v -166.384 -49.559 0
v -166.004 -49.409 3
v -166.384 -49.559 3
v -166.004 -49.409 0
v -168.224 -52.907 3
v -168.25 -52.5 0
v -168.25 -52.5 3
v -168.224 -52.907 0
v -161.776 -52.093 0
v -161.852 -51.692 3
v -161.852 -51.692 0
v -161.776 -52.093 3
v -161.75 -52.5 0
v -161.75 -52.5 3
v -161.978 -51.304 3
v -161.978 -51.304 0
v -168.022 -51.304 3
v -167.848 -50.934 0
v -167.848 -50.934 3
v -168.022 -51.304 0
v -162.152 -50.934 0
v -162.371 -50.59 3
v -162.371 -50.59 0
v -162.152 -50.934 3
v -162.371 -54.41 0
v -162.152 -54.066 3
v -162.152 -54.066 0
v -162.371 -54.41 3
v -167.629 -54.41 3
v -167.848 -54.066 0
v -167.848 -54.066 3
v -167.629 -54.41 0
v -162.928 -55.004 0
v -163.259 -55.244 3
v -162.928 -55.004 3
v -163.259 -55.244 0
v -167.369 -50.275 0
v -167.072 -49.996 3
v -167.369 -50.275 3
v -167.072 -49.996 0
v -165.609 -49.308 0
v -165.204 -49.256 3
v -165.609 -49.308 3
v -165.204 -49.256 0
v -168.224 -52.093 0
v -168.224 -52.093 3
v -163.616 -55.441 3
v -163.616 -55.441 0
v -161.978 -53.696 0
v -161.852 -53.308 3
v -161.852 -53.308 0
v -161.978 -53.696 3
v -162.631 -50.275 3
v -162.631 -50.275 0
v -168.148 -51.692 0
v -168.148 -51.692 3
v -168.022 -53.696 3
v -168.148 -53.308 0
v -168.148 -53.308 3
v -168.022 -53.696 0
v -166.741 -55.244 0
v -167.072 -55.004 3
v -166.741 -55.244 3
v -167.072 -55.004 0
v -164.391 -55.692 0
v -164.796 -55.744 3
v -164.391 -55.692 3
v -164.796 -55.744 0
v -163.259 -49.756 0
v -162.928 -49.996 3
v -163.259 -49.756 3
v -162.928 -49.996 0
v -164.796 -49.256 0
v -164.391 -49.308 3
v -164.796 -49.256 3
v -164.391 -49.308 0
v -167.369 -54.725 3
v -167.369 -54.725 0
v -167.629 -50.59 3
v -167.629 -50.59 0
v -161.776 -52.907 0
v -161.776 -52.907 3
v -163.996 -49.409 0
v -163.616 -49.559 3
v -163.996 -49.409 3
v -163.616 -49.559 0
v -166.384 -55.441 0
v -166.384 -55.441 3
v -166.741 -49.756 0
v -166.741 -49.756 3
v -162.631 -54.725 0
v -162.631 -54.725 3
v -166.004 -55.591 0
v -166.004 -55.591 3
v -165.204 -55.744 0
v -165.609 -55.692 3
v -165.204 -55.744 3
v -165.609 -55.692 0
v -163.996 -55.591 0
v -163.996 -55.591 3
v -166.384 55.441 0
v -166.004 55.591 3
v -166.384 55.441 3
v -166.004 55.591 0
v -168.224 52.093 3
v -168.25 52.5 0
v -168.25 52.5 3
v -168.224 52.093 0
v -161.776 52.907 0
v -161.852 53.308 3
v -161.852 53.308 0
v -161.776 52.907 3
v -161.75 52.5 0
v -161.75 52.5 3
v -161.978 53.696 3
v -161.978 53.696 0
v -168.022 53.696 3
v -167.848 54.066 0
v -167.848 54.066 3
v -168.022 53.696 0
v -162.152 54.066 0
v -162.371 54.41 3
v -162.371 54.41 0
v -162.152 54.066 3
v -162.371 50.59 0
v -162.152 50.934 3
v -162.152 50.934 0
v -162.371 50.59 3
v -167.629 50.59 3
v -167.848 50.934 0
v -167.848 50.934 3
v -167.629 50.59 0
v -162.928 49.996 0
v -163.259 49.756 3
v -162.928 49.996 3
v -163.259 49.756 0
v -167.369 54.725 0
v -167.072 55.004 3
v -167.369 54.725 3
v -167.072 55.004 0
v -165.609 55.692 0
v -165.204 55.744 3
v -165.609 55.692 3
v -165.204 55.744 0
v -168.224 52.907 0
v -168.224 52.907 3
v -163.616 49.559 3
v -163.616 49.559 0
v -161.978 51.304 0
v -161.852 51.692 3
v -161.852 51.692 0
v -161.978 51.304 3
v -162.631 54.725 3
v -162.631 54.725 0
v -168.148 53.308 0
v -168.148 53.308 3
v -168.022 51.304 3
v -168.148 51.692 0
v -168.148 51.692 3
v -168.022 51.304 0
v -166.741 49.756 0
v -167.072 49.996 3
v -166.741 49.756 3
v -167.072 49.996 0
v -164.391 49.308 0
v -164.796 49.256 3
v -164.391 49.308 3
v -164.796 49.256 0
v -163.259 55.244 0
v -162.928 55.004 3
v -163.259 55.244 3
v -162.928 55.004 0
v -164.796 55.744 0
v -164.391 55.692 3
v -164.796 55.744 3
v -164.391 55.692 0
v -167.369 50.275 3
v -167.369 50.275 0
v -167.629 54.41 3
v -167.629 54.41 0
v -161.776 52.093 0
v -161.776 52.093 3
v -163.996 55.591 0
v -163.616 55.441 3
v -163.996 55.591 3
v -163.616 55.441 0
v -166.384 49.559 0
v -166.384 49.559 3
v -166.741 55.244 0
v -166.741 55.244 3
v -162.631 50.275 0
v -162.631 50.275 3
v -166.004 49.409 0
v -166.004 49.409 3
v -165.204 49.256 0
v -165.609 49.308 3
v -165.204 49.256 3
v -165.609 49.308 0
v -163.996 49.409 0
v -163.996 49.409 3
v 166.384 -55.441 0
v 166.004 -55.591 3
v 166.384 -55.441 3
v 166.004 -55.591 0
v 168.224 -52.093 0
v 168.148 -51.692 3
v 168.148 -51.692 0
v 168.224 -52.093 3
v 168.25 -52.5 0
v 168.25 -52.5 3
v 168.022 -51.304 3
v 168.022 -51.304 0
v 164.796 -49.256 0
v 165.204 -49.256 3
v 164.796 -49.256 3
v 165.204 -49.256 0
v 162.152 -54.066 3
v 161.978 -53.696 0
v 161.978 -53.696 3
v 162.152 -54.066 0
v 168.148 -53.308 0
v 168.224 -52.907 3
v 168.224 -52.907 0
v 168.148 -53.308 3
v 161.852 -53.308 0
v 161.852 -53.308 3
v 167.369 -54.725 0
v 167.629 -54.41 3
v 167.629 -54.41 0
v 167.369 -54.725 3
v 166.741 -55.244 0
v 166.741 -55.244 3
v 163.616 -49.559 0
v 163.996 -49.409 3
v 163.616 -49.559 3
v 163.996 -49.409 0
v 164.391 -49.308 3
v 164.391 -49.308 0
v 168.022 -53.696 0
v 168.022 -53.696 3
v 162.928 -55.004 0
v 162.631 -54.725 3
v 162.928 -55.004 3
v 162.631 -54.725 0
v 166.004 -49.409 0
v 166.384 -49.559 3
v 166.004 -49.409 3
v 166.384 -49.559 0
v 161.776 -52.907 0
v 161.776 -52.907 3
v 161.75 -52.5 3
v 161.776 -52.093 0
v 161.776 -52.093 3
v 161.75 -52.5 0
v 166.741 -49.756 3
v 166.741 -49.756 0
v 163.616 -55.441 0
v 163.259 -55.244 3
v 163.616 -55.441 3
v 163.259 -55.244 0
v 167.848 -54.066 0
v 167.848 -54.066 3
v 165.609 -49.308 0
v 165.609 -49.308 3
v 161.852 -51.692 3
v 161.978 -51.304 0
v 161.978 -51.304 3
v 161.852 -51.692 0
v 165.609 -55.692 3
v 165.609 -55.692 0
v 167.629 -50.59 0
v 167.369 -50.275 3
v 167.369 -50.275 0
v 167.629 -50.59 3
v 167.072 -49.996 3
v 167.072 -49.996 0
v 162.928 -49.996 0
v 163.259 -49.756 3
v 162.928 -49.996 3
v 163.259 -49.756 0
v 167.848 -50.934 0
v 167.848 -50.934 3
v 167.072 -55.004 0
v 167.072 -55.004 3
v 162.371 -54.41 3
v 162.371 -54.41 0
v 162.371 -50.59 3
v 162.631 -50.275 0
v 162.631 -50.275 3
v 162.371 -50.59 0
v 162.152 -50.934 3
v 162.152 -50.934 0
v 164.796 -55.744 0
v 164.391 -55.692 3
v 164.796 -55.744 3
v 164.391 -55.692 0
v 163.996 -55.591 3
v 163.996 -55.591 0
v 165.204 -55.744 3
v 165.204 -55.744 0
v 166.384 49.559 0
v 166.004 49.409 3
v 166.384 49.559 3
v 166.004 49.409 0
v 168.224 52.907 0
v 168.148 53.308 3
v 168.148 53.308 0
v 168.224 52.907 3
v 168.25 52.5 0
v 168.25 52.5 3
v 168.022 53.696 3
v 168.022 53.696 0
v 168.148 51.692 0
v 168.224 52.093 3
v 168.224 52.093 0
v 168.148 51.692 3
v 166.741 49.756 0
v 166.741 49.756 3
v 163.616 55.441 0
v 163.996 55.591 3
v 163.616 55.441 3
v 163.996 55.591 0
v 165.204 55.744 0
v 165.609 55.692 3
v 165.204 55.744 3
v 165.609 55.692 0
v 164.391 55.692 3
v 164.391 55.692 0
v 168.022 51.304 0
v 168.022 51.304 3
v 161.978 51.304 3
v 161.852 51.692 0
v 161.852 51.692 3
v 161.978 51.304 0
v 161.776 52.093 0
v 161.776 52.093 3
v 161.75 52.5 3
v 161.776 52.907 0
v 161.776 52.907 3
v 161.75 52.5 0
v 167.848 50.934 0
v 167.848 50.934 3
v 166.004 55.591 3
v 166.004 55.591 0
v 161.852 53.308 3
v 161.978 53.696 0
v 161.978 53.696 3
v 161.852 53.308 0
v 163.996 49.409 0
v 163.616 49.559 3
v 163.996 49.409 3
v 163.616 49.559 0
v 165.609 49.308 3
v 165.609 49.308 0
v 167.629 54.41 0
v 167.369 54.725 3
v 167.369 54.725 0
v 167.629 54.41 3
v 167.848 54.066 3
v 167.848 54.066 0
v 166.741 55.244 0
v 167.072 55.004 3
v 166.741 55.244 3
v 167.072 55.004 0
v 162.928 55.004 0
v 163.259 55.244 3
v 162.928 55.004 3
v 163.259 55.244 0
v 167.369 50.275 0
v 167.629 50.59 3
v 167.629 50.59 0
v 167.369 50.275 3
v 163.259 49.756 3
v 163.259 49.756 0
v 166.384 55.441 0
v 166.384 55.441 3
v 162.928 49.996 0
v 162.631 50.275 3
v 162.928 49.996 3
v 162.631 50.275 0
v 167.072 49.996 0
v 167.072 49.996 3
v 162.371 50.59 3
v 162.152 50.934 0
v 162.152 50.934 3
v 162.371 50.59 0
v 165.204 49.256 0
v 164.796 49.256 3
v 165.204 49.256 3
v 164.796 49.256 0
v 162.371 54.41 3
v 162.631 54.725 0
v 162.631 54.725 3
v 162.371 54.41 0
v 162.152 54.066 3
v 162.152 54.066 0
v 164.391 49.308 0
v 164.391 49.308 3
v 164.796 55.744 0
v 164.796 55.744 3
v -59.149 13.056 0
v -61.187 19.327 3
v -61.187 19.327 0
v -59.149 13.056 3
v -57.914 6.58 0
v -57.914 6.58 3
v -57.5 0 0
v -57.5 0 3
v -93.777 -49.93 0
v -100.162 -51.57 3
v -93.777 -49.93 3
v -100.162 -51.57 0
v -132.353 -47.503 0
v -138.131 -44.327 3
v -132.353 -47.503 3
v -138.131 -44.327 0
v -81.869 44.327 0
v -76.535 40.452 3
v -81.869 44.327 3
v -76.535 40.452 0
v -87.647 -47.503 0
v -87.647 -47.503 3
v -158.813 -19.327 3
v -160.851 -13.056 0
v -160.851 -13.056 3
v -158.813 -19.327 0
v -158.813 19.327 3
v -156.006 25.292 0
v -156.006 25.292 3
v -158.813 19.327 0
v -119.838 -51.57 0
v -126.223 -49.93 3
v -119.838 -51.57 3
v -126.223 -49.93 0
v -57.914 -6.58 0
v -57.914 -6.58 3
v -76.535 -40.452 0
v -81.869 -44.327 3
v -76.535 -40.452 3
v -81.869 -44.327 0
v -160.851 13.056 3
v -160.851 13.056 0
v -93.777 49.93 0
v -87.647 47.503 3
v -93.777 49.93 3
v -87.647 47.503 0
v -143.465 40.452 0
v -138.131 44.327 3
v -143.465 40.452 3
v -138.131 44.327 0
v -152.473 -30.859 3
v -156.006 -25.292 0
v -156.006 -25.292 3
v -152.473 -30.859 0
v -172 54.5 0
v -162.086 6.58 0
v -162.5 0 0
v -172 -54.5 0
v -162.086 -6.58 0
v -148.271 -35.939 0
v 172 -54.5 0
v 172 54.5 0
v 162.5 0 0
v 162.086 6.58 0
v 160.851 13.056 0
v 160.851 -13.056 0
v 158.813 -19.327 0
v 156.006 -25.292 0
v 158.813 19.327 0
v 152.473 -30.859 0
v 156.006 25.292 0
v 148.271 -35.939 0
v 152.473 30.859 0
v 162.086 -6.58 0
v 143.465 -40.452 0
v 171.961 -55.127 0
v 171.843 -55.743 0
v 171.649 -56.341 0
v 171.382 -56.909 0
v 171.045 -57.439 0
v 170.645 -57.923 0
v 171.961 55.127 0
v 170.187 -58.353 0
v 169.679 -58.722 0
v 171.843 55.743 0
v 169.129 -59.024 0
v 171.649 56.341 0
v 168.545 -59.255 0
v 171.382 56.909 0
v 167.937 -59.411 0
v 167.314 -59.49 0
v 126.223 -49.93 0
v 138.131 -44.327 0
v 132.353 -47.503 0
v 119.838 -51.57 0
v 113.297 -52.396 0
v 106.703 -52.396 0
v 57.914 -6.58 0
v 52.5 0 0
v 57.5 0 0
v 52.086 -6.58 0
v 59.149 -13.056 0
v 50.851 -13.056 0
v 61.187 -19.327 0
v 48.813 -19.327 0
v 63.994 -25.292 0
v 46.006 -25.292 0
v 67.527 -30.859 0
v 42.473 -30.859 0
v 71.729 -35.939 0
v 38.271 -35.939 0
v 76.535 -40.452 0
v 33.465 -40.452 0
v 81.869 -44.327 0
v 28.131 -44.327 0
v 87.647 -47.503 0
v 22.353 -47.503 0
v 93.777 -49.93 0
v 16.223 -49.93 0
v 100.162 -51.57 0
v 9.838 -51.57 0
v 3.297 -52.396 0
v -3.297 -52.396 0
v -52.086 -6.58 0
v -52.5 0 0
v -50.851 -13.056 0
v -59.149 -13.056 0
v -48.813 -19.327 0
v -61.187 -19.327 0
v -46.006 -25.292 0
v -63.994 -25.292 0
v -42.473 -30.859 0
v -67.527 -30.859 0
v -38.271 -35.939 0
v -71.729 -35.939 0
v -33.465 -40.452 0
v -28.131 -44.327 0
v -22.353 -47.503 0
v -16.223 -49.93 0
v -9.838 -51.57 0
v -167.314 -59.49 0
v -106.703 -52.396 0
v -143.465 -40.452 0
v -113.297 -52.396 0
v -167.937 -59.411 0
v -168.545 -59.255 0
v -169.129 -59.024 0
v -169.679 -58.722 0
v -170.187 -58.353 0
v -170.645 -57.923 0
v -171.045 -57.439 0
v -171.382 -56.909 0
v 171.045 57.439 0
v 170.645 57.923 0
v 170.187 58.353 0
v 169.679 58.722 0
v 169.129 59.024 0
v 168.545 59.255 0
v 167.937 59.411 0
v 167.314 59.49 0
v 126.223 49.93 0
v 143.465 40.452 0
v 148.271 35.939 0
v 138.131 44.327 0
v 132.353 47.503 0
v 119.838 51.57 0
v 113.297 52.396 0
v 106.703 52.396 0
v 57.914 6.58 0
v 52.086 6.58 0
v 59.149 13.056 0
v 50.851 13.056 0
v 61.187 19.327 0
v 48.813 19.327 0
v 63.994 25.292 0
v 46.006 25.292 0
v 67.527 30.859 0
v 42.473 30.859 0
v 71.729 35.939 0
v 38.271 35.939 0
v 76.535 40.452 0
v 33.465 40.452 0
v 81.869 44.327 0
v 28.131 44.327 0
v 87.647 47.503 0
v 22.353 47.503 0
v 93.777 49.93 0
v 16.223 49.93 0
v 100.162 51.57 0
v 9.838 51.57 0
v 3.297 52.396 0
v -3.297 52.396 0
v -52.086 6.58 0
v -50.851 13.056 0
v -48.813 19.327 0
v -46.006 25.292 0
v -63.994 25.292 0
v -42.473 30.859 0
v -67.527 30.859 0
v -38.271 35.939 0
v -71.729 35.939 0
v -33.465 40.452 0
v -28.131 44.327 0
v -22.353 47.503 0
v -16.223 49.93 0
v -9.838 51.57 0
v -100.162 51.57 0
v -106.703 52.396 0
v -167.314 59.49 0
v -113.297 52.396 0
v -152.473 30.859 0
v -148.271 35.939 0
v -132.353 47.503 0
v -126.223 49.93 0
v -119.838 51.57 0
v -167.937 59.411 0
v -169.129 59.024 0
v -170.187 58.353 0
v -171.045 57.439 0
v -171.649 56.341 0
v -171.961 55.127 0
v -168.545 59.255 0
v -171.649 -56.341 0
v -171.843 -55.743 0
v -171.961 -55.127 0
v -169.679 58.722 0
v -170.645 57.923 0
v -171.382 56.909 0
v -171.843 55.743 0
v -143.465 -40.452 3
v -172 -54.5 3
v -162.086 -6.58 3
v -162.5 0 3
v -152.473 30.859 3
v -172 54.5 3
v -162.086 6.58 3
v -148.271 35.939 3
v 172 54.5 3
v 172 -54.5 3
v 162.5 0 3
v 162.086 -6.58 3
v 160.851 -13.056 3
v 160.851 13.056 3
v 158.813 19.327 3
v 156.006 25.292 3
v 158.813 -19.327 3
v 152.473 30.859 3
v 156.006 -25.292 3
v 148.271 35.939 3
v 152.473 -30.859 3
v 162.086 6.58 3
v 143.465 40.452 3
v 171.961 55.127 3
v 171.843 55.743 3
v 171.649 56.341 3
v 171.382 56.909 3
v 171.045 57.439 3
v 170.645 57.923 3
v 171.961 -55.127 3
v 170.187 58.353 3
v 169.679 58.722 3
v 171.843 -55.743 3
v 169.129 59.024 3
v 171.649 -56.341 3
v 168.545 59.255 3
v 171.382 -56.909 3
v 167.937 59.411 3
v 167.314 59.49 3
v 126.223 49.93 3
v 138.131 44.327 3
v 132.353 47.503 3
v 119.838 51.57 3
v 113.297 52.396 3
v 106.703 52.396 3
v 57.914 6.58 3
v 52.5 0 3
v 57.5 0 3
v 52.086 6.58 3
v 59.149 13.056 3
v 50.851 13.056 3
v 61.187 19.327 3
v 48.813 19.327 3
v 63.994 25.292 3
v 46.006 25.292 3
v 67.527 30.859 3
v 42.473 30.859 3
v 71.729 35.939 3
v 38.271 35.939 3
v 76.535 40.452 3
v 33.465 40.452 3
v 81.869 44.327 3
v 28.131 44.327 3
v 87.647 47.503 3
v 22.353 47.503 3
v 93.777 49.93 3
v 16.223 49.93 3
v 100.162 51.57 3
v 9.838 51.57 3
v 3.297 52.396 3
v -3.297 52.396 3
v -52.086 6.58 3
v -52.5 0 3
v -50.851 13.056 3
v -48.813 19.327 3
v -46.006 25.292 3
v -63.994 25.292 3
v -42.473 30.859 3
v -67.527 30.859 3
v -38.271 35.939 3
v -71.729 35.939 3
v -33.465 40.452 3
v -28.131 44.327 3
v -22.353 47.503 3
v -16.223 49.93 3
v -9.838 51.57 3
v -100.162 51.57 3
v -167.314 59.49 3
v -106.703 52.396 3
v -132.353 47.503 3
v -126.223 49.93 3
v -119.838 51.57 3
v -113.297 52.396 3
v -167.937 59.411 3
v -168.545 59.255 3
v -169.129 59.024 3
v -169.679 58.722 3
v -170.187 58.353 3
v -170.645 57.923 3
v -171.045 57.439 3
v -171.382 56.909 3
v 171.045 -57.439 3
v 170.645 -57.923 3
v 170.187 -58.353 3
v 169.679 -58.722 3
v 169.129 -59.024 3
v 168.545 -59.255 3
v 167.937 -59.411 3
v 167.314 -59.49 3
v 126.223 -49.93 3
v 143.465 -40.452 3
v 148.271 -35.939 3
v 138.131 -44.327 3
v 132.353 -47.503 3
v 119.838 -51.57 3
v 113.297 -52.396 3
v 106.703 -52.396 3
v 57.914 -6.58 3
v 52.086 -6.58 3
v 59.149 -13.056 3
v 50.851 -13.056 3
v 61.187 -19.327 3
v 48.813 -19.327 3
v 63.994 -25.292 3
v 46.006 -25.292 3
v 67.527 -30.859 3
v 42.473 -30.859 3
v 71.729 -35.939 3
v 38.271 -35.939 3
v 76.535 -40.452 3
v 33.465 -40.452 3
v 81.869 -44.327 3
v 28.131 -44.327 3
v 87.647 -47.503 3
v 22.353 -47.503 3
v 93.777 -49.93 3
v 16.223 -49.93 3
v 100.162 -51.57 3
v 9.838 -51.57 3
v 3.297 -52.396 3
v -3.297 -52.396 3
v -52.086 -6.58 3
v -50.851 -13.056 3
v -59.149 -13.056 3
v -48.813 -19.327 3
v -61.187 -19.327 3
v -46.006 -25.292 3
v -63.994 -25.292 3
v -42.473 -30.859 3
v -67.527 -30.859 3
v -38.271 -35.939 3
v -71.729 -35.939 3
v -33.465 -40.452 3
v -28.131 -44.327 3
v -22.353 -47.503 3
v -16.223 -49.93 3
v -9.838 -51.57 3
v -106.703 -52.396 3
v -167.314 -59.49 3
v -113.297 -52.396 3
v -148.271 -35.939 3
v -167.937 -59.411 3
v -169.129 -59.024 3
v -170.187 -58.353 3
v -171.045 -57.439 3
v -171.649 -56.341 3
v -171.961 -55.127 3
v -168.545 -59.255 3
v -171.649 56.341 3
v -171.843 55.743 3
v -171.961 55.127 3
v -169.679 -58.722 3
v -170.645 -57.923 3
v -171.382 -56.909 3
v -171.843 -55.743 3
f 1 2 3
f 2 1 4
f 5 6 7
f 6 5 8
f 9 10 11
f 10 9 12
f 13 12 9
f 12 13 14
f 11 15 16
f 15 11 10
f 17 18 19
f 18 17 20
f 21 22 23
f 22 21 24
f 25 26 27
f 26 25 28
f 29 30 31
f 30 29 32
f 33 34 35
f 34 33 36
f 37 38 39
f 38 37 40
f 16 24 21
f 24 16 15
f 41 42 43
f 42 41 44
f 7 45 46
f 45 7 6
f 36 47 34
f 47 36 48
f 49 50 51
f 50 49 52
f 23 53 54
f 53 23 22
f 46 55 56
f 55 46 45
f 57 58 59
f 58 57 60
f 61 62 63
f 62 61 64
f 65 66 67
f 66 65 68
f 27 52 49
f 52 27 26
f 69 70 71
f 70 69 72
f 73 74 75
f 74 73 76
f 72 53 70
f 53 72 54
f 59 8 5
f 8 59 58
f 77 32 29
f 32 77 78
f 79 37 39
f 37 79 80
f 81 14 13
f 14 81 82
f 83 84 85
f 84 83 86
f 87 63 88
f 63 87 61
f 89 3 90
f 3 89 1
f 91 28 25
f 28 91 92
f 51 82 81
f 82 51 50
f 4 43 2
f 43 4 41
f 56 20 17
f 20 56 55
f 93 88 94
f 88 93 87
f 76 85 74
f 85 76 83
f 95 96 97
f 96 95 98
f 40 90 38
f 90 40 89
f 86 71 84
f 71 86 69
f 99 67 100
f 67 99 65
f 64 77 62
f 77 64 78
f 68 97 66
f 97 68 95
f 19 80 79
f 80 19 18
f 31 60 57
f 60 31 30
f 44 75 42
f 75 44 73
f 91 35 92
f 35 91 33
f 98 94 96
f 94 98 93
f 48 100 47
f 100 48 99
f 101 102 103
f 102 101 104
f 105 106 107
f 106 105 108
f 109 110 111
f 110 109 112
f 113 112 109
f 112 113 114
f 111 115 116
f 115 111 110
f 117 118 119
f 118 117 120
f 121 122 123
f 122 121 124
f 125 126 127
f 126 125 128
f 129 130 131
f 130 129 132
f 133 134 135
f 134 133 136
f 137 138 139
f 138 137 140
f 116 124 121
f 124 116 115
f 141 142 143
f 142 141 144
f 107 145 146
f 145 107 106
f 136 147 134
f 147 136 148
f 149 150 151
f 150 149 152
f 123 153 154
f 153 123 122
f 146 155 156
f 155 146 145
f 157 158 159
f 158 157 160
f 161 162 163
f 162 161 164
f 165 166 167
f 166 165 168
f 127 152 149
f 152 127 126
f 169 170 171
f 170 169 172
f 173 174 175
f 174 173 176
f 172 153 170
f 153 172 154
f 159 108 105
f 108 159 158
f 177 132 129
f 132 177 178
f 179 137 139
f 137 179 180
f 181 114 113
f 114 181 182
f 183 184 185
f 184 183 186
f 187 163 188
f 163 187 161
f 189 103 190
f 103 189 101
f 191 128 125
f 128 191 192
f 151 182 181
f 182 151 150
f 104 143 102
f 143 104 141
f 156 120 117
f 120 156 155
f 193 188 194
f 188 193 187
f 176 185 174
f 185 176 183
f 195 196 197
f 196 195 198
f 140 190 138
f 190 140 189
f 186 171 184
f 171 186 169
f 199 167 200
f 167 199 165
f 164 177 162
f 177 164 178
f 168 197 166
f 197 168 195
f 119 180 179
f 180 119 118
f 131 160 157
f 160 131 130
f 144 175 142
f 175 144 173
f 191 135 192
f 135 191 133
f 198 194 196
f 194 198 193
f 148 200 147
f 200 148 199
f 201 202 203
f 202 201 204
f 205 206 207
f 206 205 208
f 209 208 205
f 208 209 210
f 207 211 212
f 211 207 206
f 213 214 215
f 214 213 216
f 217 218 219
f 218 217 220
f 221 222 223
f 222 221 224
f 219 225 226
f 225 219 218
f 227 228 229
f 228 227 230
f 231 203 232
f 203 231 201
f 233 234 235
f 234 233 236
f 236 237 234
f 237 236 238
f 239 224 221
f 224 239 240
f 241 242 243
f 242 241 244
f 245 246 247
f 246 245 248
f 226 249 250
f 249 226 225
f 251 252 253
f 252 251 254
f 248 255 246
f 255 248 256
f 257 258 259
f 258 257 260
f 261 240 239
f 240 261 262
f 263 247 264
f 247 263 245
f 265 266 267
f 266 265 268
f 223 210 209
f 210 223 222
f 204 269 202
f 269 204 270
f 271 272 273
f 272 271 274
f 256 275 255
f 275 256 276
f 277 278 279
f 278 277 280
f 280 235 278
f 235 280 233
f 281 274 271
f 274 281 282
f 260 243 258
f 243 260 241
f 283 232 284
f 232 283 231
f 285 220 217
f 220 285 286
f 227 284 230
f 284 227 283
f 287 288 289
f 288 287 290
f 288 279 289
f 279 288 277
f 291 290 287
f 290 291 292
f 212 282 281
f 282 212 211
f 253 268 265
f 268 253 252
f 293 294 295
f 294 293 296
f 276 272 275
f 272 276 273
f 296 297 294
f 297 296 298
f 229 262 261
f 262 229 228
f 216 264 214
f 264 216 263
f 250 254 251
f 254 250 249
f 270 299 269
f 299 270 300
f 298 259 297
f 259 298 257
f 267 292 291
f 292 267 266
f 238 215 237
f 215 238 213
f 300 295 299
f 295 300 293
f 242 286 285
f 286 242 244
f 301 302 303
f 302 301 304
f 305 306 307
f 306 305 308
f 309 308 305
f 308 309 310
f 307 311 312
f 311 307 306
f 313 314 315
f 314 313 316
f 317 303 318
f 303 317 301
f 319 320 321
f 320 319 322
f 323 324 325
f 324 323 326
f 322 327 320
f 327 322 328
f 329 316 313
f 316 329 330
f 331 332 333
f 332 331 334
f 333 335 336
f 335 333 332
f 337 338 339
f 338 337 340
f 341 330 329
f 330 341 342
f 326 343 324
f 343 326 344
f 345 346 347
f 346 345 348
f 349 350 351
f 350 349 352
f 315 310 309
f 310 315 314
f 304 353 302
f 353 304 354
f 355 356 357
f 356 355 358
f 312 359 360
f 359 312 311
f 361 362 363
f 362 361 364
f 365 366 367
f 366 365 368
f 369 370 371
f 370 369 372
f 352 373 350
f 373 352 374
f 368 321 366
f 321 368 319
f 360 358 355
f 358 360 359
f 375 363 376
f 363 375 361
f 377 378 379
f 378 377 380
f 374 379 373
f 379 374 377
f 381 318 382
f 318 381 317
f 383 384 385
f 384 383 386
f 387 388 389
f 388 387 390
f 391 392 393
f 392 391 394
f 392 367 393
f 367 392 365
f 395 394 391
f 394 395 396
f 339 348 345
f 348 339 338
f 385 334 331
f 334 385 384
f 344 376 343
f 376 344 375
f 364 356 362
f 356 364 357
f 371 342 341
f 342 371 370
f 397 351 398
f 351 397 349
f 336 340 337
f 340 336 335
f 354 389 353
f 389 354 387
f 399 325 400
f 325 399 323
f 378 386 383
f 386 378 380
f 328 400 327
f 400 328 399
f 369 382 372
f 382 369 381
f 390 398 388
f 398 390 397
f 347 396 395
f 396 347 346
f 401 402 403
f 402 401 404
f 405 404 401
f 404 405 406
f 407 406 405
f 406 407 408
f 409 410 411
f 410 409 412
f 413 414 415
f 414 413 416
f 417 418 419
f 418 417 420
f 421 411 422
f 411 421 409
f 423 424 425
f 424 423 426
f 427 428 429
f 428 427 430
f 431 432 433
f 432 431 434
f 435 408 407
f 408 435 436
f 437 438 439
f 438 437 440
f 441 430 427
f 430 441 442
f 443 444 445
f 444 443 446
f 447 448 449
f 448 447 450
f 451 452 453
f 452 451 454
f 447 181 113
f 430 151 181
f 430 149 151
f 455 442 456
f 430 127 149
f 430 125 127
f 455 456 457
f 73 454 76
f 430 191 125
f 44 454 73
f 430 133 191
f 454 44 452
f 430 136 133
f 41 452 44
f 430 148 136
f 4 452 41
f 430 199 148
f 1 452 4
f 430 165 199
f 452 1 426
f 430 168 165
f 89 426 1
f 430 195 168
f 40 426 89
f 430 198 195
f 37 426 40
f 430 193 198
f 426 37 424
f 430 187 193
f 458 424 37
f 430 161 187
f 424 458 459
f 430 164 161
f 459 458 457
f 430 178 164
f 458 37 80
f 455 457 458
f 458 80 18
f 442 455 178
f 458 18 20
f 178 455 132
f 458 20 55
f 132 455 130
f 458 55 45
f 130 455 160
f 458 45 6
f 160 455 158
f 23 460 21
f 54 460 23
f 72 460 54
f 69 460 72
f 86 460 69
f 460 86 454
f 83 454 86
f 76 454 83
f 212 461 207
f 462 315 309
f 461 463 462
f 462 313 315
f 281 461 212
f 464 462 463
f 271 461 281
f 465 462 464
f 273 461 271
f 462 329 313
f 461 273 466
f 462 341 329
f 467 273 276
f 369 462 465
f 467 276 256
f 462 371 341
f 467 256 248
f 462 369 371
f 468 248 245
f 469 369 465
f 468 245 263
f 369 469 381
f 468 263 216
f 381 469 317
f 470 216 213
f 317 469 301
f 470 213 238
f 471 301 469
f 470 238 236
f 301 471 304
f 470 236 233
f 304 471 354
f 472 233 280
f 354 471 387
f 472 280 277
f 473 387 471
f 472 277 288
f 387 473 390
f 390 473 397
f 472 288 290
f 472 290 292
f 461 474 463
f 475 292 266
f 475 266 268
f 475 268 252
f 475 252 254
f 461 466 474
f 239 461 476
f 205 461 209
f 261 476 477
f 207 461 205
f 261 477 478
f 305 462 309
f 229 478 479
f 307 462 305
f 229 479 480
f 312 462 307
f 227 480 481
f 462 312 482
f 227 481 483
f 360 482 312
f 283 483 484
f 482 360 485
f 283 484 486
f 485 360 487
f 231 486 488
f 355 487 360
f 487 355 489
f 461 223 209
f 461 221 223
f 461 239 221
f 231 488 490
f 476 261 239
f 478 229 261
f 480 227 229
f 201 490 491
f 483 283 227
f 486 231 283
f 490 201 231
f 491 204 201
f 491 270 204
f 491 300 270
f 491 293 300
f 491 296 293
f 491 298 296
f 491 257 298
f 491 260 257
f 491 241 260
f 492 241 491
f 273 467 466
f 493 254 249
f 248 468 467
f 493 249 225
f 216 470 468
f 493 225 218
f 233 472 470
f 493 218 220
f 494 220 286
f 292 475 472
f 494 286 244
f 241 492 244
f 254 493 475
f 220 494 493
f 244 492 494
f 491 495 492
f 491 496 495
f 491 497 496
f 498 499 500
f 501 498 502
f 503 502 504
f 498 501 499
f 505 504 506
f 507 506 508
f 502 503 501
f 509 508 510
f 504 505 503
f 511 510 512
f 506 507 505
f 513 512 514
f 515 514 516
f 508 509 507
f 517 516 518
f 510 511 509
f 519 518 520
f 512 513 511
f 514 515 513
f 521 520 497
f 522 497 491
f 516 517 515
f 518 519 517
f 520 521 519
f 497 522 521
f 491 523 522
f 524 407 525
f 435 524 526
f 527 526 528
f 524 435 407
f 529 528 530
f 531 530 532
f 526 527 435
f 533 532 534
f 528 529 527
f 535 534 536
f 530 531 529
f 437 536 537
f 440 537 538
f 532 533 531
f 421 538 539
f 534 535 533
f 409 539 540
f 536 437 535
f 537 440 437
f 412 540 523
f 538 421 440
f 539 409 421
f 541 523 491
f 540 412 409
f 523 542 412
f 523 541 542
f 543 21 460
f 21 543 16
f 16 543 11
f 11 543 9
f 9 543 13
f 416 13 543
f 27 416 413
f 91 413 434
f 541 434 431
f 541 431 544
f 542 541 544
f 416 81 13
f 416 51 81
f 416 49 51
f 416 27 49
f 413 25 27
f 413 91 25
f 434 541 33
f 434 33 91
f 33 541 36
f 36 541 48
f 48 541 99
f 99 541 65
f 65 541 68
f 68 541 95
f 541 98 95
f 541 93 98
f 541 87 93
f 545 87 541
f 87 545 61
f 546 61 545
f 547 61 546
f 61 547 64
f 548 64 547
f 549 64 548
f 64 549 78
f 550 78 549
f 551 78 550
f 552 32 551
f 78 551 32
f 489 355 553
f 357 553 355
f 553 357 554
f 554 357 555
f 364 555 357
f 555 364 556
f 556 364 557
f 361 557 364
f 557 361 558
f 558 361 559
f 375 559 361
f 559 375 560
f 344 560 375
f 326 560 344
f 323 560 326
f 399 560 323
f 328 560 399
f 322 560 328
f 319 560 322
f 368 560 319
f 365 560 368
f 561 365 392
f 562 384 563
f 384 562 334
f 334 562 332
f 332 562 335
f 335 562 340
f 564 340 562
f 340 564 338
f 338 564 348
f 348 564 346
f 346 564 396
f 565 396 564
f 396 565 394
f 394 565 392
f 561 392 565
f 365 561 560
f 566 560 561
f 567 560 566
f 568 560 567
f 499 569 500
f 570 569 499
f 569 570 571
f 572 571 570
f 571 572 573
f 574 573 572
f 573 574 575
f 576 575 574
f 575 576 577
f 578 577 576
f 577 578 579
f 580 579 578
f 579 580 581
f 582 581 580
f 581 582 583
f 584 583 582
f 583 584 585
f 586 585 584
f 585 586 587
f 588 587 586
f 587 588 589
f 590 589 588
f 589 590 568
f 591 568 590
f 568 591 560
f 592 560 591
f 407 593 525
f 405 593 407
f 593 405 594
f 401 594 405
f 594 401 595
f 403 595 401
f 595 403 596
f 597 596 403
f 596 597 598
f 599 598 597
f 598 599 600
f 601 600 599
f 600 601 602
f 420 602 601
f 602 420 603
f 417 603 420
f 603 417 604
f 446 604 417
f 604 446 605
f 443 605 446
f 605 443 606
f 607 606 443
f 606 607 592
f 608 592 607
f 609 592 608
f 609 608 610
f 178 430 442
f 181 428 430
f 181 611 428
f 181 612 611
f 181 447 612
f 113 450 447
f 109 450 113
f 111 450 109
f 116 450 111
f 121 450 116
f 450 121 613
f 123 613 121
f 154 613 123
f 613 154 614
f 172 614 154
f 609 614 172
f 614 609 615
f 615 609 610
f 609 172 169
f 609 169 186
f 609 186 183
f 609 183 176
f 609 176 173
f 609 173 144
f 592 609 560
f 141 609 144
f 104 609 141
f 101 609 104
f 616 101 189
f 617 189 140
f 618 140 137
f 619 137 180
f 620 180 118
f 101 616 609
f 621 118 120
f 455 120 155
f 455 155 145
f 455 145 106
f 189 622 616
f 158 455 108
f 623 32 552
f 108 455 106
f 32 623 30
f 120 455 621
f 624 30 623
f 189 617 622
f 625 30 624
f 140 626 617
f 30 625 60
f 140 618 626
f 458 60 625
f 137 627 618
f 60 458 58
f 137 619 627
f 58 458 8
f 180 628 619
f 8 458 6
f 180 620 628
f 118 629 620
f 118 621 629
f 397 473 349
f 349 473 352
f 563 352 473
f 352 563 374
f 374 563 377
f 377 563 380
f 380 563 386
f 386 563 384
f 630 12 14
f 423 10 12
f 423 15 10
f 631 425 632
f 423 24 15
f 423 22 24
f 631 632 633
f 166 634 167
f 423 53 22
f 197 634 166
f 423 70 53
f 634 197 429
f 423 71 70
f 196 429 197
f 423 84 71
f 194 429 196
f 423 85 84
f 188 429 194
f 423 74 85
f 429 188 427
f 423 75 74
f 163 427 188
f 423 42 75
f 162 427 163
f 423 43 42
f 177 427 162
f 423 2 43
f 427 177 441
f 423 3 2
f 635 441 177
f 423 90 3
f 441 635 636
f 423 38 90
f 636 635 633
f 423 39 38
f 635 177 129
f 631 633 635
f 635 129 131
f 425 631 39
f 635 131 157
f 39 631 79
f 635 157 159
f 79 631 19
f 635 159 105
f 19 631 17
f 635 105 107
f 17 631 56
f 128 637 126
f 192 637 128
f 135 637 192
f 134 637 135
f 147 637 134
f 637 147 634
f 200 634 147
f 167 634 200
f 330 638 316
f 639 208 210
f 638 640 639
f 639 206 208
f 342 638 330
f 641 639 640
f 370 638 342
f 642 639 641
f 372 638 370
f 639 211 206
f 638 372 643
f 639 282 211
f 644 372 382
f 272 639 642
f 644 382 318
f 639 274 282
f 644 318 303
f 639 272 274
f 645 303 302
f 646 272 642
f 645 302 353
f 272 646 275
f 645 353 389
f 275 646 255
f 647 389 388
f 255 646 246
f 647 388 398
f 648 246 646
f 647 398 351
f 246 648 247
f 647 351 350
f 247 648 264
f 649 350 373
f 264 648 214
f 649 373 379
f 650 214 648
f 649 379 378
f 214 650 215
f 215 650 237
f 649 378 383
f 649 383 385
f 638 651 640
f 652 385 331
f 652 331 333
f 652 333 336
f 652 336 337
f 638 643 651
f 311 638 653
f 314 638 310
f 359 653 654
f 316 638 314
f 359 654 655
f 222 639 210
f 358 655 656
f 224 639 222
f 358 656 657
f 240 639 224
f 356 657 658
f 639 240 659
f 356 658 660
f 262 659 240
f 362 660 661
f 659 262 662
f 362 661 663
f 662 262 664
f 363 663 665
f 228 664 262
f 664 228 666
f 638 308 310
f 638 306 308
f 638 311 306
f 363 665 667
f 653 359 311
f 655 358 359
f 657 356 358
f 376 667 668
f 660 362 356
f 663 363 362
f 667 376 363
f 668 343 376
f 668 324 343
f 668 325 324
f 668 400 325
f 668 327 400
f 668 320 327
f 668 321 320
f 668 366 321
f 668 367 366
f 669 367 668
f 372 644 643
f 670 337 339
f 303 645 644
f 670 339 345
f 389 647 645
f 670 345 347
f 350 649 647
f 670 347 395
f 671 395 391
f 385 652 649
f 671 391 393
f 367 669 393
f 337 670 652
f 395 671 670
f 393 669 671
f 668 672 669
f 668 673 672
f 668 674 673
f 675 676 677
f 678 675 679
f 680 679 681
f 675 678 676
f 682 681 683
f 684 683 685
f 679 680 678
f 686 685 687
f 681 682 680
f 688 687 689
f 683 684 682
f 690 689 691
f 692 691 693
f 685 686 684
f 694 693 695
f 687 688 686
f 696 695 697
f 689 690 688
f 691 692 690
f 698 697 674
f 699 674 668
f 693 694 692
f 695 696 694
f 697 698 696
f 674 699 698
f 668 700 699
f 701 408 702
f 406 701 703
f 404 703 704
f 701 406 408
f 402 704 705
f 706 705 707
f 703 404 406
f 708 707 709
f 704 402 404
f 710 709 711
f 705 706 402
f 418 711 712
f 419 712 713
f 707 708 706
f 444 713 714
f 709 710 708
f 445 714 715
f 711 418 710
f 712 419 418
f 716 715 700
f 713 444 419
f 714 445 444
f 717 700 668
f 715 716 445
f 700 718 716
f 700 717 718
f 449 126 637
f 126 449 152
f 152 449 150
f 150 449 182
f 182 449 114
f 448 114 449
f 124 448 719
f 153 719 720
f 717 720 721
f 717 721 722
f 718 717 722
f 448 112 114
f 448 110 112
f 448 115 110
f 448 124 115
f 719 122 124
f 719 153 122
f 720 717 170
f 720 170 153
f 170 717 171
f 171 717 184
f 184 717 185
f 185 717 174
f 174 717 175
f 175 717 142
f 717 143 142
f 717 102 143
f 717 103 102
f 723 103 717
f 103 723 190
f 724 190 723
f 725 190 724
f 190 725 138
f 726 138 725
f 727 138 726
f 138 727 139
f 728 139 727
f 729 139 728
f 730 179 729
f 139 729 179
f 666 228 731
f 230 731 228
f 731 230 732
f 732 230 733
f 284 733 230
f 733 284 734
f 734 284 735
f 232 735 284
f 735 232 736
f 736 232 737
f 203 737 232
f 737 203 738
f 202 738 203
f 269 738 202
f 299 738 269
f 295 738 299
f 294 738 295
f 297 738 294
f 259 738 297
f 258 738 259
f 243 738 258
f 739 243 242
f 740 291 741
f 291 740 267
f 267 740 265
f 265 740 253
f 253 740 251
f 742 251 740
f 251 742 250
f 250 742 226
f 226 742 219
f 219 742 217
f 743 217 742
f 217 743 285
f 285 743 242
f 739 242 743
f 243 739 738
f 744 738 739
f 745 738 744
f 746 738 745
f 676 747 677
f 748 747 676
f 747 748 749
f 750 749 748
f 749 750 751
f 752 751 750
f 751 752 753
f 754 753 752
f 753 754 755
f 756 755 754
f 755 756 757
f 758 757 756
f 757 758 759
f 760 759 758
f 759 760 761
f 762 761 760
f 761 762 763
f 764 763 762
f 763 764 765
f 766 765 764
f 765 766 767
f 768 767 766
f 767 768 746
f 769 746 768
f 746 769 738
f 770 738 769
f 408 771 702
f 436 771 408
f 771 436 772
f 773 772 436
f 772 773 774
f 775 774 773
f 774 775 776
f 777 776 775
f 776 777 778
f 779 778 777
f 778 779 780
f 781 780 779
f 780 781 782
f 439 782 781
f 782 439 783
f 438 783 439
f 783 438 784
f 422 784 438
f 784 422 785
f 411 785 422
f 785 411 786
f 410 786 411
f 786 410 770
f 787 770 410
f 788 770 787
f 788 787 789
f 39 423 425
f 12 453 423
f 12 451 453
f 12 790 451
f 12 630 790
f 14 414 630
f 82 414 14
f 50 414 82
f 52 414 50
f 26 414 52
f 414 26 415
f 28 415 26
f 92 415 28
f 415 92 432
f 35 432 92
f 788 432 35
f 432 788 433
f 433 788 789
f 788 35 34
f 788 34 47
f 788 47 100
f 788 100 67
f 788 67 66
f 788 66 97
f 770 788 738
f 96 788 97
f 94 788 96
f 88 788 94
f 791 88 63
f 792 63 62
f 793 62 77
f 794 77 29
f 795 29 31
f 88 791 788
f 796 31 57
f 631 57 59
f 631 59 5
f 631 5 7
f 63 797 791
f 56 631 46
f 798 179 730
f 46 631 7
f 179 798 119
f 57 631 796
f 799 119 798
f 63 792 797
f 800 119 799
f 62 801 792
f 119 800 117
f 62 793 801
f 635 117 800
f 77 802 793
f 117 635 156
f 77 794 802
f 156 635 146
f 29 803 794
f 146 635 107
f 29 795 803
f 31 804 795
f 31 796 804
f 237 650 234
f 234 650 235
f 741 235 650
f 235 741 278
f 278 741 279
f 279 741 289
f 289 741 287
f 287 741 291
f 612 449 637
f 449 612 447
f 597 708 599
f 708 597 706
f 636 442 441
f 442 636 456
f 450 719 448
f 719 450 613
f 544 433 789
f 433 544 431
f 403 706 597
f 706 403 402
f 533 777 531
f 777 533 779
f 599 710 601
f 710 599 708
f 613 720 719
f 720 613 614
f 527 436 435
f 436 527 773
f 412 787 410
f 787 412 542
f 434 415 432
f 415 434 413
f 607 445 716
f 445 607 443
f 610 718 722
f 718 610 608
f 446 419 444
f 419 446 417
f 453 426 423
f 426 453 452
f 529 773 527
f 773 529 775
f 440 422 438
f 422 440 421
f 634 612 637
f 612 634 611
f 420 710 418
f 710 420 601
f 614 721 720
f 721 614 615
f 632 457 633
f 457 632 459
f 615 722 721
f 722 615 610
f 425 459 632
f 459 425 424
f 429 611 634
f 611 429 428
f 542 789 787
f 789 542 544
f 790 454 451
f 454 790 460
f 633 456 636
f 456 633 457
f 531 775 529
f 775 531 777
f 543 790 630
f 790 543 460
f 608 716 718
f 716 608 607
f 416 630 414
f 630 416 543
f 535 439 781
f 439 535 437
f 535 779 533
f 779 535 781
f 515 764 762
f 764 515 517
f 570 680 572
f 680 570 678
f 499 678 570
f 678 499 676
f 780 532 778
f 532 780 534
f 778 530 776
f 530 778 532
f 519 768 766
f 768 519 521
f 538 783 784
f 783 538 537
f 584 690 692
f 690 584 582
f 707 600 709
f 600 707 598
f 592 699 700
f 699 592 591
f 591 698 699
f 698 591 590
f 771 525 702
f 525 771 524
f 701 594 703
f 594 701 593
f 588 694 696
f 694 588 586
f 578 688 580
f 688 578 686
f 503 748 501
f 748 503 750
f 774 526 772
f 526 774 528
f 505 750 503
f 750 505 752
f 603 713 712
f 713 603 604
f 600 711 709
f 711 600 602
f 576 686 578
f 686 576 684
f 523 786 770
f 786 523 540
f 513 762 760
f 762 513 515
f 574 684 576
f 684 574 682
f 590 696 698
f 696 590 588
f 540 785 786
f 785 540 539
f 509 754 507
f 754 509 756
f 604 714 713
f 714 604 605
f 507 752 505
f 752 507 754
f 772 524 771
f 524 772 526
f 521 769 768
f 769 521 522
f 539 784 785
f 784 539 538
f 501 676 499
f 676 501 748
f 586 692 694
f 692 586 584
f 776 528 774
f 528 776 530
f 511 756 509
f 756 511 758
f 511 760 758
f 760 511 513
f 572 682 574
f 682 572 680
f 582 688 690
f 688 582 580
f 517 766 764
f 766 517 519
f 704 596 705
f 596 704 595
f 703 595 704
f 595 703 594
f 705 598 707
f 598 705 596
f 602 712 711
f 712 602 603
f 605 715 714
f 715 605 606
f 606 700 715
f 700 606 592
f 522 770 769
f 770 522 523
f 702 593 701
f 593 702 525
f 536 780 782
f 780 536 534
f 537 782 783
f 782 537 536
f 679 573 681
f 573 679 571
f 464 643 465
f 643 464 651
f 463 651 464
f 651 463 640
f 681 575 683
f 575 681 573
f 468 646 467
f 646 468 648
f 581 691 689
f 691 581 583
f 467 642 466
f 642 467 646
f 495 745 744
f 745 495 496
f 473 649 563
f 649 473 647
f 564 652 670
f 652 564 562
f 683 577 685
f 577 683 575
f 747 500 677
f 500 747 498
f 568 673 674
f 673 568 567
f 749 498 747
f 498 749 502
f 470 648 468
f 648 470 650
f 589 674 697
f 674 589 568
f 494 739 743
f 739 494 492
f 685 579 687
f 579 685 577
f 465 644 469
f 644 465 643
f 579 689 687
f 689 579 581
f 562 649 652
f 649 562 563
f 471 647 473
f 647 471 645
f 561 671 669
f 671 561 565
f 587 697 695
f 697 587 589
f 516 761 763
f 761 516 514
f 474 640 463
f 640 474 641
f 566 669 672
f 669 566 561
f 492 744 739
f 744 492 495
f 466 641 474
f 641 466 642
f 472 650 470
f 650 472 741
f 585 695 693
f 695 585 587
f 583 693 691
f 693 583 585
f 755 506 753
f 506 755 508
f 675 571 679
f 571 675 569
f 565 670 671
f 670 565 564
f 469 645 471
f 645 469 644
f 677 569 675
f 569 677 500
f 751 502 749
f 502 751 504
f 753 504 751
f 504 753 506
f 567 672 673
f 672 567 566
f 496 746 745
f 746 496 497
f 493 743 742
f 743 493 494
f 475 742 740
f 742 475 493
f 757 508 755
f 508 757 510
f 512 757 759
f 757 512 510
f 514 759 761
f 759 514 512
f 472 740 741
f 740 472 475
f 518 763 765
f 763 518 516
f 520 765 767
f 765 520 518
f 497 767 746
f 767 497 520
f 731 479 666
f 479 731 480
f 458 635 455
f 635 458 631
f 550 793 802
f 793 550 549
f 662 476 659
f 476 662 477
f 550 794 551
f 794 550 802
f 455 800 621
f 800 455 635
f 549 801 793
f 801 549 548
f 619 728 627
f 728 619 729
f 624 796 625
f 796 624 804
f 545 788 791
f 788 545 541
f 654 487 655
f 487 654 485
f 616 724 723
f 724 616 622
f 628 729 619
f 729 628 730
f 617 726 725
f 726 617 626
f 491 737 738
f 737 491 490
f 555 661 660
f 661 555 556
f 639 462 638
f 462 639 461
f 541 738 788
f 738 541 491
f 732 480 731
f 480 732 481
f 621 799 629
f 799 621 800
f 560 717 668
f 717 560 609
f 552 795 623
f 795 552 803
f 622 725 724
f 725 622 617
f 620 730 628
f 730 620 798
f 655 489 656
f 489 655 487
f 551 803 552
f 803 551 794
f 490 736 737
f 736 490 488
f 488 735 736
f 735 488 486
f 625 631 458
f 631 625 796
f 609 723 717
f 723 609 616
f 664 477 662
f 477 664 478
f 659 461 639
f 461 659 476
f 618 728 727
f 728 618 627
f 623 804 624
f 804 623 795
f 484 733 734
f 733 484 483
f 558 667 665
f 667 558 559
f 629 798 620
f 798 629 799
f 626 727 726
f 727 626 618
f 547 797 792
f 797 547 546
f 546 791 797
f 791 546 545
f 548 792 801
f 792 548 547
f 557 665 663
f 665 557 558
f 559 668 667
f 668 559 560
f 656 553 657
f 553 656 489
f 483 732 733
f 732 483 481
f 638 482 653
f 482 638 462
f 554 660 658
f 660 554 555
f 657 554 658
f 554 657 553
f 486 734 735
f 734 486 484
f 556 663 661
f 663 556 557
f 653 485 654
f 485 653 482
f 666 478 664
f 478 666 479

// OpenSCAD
$fn = 50;


difference() {
	union() {
		hull() {
			translate(v = [-167.0000000000, 54.5000000000, 0]) {
				cylinder(h = 3, r = 5);
			}
			translate(v = [167.0000000000, 54.5000000000, 0]) {
				cylinder(h = 3, r = 5);
			}
			translate(v = [-167.0000000000, -54.5000000000, 0]) {
				cylinder(h = 3, r = 5);
			}
			translate(v = [167.0000000000, -54.5000000000, 0]) {
				cylinder(h = 3, r = 5);
			}
		}
	}
	union() {
		#translate(v = [-165.0000000000, -52.5000000000, -100.0000000000]) {
			cylinder(h = 200, r = 3.2500000000);
		}
		#translate(v = [-165.0000000000, 52.5000000000, -100.0000000000]) {
			cylinder(h = 200, r = 3.2500000000);
		}
		#translate(v = [165.0000000000, -52.5000000000, -100.0000000000]) {
			cylinder(h = 200, r = 3.2500000000);
		}
		#translate(v = [165.0000000000, 52.5000000000, -100.0000000000]) {
			cylinder(h = 200, r = 3.2500000000);
		}
		#translate(v = [-110.0000000000, 0, 0]) {
			cylinder(h = 3, r = 52.5000000000);
		}
		#cylinder(h = 3, r = 52.5000000000);
		#translate(v = [110.0000000000, 0, 0]) {
			cylinder(h = 3, r = 52.5000000000);
		}
	}
}
